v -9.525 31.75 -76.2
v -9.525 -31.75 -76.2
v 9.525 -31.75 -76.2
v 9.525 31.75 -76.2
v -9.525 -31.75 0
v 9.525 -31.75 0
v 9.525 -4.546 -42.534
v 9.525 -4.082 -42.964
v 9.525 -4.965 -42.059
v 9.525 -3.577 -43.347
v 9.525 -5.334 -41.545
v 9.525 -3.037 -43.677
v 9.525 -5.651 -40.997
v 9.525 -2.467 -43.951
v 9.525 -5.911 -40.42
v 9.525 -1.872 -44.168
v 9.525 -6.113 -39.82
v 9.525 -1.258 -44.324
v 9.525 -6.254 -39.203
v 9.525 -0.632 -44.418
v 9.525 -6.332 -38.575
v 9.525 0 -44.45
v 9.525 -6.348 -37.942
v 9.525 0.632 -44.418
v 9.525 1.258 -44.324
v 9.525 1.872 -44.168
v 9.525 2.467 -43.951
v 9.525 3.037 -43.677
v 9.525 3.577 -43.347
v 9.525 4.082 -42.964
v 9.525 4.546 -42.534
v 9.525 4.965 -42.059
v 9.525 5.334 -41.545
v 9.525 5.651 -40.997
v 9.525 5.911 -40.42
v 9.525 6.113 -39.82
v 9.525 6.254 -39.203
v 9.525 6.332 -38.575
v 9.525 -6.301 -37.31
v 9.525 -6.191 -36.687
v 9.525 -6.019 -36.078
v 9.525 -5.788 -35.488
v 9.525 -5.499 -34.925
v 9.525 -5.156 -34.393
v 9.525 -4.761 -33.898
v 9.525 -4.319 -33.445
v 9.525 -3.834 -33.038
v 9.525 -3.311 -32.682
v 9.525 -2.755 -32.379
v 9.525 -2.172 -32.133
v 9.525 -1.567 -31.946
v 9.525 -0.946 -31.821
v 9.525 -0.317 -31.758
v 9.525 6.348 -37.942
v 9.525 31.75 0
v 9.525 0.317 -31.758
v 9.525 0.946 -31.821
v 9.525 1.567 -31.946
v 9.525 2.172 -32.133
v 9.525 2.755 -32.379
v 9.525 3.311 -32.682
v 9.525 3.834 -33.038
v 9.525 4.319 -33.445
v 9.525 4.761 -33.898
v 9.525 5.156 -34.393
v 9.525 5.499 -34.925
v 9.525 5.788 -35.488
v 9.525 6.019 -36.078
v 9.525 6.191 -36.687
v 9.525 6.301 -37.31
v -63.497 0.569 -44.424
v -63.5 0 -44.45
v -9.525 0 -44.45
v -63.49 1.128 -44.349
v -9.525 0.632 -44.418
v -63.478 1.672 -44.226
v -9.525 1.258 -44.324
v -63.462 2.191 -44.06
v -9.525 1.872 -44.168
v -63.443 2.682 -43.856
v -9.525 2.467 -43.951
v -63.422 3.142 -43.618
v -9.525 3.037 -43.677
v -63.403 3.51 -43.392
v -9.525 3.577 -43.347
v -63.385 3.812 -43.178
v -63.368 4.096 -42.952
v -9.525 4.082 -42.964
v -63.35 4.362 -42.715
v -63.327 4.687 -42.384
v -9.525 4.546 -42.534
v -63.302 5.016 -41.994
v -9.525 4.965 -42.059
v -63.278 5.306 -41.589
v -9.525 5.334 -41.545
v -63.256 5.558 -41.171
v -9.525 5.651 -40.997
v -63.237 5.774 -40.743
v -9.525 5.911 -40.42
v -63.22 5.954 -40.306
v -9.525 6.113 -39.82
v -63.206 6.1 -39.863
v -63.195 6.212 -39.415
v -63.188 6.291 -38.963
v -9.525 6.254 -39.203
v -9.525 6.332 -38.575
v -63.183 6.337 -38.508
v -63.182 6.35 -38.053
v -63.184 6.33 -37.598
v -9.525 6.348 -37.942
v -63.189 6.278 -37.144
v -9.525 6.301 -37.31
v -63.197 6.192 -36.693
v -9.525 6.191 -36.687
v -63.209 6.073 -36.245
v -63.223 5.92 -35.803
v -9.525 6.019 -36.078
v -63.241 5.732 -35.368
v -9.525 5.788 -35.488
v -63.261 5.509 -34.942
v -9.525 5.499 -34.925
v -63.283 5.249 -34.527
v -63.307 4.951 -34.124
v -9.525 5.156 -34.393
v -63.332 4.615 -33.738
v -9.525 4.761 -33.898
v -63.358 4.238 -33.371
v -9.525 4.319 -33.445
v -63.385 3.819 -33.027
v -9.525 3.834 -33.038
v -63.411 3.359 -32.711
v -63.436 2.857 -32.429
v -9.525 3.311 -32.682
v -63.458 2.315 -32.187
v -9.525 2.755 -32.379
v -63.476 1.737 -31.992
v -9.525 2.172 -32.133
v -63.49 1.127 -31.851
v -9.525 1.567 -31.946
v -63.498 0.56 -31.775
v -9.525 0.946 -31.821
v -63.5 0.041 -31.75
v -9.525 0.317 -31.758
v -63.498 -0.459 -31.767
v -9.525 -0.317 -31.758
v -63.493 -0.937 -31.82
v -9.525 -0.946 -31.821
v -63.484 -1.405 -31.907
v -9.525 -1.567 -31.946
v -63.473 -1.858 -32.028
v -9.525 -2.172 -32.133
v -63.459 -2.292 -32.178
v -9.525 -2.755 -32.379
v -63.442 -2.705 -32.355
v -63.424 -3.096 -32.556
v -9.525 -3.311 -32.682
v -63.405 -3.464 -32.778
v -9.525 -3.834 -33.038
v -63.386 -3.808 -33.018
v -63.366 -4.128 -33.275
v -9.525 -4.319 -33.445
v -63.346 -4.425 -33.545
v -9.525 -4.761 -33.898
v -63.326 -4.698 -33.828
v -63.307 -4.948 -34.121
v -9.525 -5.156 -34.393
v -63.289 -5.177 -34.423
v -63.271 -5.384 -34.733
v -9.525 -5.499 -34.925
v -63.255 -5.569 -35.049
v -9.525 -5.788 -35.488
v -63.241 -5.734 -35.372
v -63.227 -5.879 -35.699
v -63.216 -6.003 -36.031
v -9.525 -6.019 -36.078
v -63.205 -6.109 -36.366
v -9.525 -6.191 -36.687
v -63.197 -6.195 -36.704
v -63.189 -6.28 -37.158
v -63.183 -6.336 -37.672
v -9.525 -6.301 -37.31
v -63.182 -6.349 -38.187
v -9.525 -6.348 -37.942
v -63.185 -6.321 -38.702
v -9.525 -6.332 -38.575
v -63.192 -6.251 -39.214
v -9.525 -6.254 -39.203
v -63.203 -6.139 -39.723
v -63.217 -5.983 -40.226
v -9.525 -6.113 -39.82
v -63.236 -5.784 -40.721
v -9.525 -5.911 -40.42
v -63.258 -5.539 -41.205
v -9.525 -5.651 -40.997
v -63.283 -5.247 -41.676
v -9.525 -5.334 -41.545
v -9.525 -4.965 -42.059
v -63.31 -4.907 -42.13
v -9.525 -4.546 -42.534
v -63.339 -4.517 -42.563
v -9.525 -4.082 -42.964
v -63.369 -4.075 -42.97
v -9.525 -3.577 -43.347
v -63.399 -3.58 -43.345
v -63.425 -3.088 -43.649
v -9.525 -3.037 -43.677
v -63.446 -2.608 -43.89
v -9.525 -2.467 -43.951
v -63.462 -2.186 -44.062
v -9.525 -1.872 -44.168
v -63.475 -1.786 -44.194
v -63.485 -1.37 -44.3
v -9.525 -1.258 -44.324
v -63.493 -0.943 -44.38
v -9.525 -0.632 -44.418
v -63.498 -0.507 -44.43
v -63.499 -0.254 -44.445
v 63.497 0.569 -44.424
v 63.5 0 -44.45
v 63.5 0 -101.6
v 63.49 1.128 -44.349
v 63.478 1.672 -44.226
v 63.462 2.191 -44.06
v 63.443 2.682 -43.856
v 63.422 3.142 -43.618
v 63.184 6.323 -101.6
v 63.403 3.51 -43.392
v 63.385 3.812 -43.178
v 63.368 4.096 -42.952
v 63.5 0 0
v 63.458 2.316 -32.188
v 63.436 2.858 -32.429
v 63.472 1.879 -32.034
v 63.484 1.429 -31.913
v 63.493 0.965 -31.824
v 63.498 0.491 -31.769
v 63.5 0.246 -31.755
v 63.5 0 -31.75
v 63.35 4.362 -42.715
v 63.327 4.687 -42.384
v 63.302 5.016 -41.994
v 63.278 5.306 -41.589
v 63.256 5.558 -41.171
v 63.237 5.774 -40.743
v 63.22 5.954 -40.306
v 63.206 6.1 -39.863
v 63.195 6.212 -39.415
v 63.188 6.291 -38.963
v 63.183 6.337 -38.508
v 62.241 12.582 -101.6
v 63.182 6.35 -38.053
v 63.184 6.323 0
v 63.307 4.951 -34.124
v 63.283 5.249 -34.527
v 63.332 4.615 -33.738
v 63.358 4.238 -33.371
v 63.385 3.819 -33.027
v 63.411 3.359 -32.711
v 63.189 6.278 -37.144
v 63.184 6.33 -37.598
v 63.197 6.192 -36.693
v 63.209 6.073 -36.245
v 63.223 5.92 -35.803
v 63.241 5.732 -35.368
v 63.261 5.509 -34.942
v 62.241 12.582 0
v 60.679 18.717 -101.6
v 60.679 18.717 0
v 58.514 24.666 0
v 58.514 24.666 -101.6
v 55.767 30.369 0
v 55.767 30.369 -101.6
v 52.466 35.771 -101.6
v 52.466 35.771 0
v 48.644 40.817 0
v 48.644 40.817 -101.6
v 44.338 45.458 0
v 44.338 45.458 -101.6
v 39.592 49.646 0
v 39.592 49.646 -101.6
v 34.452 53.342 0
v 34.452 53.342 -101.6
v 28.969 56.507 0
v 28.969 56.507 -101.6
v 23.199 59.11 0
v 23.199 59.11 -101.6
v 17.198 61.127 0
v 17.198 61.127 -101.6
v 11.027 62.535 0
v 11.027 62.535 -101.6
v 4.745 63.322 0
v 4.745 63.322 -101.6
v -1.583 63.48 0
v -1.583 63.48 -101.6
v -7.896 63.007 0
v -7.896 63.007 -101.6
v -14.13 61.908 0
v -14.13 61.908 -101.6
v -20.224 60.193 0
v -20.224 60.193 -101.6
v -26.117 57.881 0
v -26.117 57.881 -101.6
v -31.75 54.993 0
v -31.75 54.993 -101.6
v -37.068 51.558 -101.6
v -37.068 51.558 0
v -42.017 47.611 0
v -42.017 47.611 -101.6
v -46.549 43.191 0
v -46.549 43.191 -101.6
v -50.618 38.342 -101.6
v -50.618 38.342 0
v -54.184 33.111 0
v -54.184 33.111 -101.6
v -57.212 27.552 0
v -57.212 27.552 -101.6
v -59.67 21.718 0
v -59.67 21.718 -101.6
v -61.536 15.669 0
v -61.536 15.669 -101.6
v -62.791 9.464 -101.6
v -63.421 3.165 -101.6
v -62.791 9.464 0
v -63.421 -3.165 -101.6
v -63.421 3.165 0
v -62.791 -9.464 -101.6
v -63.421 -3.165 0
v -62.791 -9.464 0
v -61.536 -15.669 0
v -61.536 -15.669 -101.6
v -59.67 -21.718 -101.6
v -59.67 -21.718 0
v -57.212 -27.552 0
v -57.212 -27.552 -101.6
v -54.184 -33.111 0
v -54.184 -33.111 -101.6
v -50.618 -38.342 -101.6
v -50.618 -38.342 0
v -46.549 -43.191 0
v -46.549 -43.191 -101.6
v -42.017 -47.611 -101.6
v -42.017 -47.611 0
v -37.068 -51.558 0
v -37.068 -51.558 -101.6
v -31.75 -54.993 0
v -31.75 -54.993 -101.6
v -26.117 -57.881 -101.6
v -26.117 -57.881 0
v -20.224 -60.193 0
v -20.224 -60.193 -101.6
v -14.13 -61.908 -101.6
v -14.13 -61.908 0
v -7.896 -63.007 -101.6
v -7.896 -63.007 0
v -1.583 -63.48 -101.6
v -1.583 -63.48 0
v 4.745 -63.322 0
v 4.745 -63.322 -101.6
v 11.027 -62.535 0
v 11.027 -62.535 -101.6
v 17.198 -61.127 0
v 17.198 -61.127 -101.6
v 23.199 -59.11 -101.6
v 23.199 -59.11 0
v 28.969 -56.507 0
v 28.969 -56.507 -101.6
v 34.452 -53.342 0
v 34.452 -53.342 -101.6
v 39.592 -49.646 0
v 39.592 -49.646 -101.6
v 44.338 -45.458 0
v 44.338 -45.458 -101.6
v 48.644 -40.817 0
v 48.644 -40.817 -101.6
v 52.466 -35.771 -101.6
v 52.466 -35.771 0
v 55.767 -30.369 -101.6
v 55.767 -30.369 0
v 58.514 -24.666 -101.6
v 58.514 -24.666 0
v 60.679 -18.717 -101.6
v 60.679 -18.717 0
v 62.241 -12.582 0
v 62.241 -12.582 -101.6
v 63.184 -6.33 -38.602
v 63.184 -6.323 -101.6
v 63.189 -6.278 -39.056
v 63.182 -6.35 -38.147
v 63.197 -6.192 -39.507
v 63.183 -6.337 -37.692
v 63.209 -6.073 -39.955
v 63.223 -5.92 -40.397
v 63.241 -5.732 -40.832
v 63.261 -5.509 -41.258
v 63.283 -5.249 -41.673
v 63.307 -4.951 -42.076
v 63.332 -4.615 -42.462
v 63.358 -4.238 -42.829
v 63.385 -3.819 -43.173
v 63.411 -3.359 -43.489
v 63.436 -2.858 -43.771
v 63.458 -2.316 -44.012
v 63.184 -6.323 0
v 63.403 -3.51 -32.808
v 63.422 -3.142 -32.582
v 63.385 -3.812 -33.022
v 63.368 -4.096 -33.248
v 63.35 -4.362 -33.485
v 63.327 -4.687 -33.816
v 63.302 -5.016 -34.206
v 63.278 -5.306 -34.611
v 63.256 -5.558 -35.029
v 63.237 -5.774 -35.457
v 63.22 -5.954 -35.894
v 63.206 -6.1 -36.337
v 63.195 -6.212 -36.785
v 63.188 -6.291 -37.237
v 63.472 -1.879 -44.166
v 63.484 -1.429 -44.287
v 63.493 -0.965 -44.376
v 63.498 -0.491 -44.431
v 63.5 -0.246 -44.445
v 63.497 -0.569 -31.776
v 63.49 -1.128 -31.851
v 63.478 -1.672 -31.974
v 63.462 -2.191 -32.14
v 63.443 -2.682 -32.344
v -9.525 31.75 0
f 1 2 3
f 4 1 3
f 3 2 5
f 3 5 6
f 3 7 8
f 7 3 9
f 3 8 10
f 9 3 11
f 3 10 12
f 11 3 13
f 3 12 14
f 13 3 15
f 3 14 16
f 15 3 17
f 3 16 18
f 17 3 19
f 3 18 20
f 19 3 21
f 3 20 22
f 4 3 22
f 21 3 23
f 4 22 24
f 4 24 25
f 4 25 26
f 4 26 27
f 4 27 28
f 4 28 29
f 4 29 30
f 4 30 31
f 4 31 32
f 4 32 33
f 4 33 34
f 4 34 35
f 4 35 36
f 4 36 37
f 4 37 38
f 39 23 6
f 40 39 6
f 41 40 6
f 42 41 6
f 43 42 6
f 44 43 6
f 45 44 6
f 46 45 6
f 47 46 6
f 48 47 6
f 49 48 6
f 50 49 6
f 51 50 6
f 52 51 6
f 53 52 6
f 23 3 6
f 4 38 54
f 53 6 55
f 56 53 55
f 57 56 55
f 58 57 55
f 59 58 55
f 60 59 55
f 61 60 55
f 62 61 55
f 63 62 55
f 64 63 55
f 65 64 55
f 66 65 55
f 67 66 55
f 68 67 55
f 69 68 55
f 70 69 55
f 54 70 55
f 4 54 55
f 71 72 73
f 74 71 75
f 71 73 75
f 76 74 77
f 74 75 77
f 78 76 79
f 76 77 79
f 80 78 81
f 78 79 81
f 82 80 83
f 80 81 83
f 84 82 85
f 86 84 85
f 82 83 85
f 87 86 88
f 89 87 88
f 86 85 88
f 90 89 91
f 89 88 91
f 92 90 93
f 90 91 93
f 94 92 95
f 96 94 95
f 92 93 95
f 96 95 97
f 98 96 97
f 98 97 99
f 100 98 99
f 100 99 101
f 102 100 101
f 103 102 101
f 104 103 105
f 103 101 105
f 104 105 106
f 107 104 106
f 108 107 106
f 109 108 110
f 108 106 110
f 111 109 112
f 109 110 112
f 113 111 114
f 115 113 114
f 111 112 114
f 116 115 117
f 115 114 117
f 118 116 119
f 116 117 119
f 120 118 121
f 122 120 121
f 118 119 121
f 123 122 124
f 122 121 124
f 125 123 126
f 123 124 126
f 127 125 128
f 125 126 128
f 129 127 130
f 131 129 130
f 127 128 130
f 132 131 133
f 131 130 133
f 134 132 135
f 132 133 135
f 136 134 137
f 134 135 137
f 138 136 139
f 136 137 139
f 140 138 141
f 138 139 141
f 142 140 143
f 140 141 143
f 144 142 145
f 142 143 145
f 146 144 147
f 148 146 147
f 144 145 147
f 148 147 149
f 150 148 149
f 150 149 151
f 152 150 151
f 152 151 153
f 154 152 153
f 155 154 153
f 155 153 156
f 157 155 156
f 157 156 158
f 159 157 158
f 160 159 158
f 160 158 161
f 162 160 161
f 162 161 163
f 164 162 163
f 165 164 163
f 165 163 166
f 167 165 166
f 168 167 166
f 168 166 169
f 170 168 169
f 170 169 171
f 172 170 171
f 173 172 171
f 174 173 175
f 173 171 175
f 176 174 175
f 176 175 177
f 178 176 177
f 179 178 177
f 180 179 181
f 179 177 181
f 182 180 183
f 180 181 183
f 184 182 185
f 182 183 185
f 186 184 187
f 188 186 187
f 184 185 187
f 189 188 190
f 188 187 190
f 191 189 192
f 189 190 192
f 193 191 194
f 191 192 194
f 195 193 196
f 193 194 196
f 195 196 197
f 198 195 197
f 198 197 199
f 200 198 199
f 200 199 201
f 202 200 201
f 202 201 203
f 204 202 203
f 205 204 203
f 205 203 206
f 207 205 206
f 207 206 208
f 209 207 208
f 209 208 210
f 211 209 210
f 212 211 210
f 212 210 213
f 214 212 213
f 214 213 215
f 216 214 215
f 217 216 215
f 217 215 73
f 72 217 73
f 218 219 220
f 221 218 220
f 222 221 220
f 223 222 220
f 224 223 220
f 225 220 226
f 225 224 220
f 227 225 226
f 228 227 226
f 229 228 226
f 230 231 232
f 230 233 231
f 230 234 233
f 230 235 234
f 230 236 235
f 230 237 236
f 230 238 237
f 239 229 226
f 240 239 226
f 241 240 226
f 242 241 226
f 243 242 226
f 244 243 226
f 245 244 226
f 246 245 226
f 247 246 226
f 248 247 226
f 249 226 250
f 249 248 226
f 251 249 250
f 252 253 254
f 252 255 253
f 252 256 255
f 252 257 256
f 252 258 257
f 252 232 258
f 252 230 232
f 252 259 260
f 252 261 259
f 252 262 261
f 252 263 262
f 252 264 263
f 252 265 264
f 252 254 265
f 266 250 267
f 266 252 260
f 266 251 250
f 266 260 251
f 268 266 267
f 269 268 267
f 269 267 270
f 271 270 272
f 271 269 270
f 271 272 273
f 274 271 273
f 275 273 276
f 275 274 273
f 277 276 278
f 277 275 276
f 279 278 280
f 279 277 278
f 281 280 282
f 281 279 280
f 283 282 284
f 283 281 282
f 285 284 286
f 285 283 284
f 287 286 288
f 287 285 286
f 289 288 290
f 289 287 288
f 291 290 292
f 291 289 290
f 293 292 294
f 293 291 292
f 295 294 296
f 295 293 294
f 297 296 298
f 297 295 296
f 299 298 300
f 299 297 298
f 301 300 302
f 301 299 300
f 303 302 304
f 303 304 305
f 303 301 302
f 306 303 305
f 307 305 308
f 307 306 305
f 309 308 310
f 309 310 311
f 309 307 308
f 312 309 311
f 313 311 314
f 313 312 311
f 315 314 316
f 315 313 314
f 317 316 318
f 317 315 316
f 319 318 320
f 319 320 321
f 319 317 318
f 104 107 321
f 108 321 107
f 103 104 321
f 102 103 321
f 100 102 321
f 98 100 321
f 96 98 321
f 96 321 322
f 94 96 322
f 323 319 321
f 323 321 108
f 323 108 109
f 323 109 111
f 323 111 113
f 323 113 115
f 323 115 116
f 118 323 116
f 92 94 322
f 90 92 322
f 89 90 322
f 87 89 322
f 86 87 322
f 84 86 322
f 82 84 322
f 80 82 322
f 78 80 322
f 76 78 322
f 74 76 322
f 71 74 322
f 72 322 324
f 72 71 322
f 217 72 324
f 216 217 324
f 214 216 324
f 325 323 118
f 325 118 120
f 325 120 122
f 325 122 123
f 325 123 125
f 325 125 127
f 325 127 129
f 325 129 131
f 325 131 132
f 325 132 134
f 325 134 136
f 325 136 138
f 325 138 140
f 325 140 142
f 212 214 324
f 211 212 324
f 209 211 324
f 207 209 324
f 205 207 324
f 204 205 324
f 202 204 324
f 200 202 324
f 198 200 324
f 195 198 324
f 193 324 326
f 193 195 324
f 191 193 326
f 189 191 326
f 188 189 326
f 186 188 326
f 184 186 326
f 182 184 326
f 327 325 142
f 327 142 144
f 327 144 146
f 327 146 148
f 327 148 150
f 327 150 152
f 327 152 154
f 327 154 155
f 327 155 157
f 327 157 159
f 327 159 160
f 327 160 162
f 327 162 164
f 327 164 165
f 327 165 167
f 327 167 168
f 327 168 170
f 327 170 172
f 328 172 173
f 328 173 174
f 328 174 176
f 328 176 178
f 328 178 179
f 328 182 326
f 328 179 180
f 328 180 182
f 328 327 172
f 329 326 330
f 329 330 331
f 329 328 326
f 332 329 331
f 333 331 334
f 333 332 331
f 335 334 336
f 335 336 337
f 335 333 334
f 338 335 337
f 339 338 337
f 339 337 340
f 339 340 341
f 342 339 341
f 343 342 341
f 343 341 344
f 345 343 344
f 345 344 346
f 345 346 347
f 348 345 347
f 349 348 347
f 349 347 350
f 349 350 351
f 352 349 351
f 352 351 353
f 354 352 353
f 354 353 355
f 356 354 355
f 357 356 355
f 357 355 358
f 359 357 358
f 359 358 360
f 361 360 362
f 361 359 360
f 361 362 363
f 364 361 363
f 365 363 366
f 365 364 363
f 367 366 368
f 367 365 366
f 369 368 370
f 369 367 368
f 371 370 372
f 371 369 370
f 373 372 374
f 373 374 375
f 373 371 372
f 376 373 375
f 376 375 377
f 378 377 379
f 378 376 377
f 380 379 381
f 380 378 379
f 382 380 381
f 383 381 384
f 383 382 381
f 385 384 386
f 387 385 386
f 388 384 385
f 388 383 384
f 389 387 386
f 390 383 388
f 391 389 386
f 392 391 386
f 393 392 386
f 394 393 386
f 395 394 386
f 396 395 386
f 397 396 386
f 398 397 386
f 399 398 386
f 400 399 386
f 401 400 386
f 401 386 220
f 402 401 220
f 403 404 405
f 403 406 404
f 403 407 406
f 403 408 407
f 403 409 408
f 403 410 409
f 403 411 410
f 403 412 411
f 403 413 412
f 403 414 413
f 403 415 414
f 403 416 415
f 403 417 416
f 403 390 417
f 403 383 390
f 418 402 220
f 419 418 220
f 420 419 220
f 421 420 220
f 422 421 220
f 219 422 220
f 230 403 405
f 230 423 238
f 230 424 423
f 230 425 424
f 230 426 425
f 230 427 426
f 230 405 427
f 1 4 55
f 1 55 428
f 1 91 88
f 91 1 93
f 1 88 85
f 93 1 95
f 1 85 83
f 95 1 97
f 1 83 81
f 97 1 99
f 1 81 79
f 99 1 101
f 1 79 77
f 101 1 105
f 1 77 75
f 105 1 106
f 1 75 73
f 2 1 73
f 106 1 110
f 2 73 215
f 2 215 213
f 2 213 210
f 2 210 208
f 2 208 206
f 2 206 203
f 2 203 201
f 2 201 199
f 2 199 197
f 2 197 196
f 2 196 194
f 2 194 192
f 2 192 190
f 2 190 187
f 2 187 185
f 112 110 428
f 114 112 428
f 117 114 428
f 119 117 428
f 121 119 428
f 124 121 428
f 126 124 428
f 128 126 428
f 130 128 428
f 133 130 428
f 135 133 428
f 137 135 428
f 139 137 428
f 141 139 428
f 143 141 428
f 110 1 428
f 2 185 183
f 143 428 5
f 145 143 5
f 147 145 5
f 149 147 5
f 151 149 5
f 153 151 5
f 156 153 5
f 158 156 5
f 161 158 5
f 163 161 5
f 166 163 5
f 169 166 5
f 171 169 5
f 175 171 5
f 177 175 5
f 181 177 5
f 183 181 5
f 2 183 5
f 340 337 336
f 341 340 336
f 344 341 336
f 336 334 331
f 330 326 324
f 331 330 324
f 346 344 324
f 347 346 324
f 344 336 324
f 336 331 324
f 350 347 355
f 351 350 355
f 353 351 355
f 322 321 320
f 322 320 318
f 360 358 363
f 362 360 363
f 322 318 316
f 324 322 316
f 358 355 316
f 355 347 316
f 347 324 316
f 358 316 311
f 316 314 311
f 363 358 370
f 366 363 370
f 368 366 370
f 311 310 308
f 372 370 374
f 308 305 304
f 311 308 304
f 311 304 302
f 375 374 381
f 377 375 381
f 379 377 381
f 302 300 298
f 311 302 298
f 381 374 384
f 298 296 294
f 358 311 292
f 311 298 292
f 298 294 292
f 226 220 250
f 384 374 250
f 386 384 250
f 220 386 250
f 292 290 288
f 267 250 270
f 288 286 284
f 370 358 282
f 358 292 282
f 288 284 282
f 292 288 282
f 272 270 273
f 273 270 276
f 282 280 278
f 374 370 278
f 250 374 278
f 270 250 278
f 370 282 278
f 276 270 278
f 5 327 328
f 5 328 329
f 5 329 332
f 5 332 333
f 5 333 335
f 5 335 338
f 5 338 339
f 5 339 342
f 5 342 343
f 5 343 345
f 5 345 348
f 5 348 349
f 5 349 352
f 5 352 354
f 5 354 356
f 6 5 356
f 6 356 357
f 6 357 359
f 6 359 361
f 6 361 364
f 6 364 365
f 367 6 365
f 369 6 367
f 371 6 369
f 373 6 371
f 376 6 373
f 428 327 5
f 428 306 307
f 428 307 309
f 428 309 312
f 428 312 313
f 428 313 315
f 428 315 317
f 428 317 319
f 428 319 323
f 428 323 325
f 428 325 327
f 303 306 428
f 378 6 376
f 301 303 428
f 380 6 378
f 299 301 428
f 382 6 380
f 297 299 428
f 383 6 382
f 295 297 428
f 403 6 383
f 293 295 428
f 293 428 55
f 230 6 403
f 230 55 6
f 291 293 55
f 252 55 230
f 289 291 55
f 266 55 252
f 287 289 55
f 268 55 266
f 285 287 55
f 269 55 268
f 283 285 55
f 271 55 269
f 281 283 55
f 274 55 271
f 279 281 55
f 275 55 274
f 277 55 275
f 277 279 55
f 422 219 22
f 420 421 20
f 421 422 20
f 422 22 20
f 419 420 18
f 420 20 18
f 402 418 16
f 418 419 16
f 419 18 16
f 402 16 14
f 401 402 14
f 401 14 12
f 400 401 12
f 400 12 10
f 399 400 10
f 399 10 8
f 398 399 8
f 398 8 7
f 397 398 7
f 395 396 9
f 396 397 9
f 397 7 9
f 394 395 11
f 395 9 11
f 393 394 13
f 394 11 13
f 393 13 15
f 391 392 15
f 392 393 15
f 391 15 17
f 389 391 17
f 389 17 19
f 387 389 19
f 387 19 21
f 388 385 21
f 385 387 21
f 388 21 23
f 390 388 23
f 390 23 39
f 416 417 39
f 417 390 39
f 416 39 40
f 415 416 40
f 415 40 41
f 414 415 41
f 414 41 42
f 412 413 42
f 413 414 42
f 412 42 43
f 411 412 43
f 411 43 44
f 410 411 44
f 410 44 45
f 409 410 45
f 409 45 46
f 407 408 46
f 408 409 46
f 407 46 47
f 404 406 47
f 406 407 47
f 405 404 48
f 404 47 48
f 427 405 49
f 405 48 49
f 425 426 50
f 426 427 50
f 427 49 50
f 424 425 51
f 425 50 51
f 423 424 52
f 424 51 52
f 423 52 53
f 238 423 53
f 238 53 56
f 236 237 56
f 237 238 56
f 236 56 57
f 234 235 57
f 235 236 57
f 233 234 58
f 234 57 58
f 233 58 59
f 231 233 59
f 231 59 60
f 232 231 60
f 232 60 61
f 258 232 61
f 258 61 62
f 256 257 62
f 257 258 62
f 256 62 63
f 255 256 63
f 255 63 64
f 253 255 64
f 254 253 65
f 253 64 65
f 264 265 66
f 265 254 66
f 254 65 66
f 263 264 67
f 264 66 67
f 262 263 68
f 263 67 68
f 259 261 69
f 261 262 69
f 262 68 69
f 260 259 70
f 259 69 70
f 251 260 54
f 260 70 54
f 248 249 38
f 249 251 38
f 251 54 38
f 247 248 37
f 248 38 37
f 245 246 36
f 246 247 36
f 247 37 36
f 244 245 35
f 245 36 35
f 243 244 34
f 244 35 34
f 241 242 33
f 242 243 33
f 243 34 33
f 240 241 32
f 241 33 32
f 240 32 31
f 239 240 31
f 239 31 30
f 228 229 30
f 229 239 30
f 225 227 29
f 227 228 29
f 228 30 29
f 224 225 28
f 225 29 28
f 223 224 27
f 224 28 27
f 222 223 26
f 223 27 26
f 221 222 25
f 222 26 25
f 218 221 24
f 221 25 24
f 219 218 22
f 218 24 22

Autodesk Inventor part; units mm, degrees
ref_plane "YZ Plane" through (0, 0, 0) normal (1, 0, 0) x (0, 1, 0)
ref_plane "XZ Plane" through (0, 0, 0) normal (0, 1, 0) x (-1, 0, 0)
ref_plane "XY Plane" through (0, 0, 0) normal (0, 0, 1) x (1, 0, 0)
sketch "Sketch1" plane through (0, 0, 0) normal (0, 0, 1) x (1, 0, 0)
  circle A0 centre (0, 0) radius 63.5
  dimension "d0" = 127
extrude "Extrusion1" add sketch "Sketch1" against normal blind 101.6
sketch "Sketch2" plane through (0, 0, 0) normal (0, 0, 1) x (1, 0, 0)
  line L0 (-9.525, -31.75) -> (9.525, -31.75)
  line L1 (9.525, -31.75) -> (9.525, 31.75)
  line L2 (9.525, 31.75) -> (-9.525, 31.75)
  line L3 (-9.525, 31.75) -> (-9.525, -31.75)
  line L4 (-9.525, -31.75) -> (9.525, 31.75) construction
  line L5 (9.525, -31.75) -> (-9.525, 31.75) construction
  point P0 (0, 0)
  dimension "d3" = 63.5
  dimension "d4" = 19.05
extrude "Extrusion2" cut sketch "Sketch2" against normal blind 76.2
sketch "Sketch3" plane through (-9.525, -31.75, 0) normal (1, 0, 0) x (0, 0, -1)
  circle A0 centre (38.1, 31.75) radius 6.35
  line L0 (0, 0) -> (76.2, 0) projected
  line L1 (0, 0) -> (0, 63.5) projected
  point P0 (0, 31.75)
  dimension "d7" = 12.7
  dimension "d8" = 31.75
  dimension "d9" = 38.1
extrude "Extrusion3" cut sketch "Sketch3" along normal through all both and the other way through all
properties part number "CS-Slider"
